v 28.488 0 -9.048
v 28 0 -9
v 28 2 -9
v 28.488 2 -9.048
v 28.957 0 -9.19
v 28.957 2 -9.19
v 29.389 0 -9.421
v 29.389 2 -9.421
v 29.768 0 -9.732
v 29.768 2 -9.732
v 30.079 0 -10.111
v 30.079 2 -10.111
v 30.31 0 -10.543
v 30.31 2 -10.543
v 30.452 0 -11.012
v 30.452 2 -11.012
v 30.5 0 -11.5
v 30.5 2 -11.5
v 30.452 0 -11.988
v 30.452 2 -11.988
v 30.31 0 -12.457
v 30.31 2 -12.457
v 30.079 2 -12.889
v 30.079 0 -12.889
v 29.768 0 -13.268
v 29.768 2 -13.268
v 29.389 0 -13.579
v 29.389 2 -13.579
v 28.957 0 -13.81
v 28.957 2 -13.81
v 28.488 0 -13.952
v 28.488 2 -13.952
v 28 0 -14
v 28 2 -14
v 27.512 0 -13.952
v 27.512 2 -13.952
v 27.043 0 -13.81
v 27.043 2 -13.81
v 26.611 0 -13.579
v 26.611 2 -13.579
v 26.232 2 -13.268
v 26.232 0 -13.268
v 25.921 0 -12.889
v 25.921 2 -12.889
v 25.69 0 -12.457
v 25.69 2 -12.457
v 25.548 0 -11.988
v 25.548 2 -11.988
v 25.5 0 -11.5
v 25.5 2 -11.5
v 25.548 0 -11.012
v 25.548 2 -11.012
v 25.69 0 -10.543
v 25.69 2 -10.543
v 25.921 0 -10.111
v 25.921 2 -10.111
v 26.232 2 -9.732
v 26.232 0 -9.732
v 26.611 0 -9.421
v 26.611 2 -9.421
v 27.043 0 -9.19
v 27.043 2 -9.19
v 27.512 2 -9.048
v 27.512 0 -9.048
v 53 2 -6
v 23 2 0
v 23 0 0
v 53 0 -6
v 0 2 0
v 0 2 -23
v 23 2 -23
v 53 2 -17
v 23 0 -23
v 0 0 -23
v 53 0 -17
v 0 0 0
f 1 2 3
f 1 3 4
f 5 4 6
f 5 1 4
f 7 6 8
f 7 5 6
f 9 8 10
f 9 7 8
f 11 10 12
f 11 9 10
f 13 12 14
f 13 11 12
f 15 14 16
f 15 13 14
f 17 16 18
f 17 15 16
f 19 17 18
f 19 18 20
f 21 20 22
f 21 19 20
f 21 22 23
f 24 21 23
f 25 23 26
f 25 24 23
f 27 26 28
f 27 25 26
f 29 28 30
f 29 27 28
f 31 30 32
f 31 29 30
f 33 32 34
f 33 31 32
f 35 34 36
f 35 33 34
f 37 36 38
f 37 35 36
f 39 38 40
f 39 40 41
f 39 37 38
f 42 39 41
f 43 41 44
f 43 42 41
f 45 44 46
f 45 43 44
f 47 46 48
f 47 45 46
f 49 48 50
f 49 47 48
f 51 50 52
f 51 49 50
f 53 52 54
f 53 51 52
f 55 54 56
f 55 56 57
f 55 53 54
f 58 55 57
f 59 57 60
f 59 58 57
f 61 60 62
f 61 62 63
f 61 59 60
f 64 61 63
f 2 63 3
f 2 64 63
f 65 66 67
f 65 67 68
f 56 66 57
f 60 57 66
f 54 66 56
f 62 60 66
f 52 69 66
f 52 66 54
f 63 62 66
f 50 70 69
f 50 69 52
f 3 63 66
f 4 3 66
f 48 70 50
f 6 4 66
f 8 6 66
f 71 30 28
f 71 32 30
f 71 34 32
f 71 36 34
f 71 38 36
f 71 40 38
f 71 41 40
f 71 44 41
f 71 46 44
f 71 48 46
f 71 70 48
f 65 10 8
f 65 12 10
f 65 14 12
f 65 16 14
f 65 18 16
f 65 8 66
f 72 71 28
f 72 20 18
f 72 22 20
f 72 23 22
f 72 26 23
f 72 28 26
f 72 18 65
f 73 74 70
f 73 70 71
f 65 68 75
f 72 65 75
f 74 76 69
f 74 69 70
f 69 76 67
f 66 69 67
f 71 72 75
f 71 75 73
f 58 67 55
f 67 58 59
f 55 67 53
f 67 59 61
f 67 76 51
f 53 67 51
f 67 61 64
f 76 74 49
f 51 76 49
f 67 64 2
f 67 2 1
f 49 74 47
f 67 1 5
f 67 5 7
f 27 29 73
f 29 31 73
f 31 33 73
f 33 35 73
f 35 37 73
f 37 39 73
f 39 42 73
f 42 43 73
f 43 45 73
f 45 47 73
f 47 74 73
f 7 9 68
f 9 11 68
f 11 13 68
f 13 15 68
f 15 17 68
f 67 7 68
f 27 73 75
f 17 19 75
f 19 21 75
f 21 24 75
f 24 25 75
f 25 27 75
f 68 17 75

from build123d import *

# Parameters (mm, degrees)
SKETCH_1_W          = 53
SKETCH_1_H          = 23
SKETCH_1_R          = 2.5
EXTRUDE_1_DEPTH     = 2
CUT_EXTRUDE_1_DEPTH = 2


with BuildPart() as part:
    # 草图1 → 凸台-拉伸1 (new body)
    with BuildSketch(Plane(origin=(0, 0, 0), x_dir=(1, 0, 0), z_dir=(0, 1, 0))):
        with Locations((26.5, 11.5)):
            Rectangle(SKETCH_1_W, SKETCH_1_H)
        with Locations(Location((28, 11.5, 0), (0, 0, 270))):
            Circle(SKETCH_1_R, mode=Mode.SUBTRACT)
    extrude(amount=EXTRUDE_1_DEPTH)

    # 草图2 → 切除-拉伸1 (cut)
    with BuildSketch(Plane(origin=(0, 2, 0), x_dir=(1, 0, 0), z_dir=(0, 1, 0))):
        Polygon((53, 23), (53, 17), (23, 23), align=None)
        Polygon((23, 0), (53, 6), (53, 0), align=None)
    extrude(amount=-CUT_EXTRUDE_1_DEPTH, mode=Mode.SUBTRACT)


solid = part.part
